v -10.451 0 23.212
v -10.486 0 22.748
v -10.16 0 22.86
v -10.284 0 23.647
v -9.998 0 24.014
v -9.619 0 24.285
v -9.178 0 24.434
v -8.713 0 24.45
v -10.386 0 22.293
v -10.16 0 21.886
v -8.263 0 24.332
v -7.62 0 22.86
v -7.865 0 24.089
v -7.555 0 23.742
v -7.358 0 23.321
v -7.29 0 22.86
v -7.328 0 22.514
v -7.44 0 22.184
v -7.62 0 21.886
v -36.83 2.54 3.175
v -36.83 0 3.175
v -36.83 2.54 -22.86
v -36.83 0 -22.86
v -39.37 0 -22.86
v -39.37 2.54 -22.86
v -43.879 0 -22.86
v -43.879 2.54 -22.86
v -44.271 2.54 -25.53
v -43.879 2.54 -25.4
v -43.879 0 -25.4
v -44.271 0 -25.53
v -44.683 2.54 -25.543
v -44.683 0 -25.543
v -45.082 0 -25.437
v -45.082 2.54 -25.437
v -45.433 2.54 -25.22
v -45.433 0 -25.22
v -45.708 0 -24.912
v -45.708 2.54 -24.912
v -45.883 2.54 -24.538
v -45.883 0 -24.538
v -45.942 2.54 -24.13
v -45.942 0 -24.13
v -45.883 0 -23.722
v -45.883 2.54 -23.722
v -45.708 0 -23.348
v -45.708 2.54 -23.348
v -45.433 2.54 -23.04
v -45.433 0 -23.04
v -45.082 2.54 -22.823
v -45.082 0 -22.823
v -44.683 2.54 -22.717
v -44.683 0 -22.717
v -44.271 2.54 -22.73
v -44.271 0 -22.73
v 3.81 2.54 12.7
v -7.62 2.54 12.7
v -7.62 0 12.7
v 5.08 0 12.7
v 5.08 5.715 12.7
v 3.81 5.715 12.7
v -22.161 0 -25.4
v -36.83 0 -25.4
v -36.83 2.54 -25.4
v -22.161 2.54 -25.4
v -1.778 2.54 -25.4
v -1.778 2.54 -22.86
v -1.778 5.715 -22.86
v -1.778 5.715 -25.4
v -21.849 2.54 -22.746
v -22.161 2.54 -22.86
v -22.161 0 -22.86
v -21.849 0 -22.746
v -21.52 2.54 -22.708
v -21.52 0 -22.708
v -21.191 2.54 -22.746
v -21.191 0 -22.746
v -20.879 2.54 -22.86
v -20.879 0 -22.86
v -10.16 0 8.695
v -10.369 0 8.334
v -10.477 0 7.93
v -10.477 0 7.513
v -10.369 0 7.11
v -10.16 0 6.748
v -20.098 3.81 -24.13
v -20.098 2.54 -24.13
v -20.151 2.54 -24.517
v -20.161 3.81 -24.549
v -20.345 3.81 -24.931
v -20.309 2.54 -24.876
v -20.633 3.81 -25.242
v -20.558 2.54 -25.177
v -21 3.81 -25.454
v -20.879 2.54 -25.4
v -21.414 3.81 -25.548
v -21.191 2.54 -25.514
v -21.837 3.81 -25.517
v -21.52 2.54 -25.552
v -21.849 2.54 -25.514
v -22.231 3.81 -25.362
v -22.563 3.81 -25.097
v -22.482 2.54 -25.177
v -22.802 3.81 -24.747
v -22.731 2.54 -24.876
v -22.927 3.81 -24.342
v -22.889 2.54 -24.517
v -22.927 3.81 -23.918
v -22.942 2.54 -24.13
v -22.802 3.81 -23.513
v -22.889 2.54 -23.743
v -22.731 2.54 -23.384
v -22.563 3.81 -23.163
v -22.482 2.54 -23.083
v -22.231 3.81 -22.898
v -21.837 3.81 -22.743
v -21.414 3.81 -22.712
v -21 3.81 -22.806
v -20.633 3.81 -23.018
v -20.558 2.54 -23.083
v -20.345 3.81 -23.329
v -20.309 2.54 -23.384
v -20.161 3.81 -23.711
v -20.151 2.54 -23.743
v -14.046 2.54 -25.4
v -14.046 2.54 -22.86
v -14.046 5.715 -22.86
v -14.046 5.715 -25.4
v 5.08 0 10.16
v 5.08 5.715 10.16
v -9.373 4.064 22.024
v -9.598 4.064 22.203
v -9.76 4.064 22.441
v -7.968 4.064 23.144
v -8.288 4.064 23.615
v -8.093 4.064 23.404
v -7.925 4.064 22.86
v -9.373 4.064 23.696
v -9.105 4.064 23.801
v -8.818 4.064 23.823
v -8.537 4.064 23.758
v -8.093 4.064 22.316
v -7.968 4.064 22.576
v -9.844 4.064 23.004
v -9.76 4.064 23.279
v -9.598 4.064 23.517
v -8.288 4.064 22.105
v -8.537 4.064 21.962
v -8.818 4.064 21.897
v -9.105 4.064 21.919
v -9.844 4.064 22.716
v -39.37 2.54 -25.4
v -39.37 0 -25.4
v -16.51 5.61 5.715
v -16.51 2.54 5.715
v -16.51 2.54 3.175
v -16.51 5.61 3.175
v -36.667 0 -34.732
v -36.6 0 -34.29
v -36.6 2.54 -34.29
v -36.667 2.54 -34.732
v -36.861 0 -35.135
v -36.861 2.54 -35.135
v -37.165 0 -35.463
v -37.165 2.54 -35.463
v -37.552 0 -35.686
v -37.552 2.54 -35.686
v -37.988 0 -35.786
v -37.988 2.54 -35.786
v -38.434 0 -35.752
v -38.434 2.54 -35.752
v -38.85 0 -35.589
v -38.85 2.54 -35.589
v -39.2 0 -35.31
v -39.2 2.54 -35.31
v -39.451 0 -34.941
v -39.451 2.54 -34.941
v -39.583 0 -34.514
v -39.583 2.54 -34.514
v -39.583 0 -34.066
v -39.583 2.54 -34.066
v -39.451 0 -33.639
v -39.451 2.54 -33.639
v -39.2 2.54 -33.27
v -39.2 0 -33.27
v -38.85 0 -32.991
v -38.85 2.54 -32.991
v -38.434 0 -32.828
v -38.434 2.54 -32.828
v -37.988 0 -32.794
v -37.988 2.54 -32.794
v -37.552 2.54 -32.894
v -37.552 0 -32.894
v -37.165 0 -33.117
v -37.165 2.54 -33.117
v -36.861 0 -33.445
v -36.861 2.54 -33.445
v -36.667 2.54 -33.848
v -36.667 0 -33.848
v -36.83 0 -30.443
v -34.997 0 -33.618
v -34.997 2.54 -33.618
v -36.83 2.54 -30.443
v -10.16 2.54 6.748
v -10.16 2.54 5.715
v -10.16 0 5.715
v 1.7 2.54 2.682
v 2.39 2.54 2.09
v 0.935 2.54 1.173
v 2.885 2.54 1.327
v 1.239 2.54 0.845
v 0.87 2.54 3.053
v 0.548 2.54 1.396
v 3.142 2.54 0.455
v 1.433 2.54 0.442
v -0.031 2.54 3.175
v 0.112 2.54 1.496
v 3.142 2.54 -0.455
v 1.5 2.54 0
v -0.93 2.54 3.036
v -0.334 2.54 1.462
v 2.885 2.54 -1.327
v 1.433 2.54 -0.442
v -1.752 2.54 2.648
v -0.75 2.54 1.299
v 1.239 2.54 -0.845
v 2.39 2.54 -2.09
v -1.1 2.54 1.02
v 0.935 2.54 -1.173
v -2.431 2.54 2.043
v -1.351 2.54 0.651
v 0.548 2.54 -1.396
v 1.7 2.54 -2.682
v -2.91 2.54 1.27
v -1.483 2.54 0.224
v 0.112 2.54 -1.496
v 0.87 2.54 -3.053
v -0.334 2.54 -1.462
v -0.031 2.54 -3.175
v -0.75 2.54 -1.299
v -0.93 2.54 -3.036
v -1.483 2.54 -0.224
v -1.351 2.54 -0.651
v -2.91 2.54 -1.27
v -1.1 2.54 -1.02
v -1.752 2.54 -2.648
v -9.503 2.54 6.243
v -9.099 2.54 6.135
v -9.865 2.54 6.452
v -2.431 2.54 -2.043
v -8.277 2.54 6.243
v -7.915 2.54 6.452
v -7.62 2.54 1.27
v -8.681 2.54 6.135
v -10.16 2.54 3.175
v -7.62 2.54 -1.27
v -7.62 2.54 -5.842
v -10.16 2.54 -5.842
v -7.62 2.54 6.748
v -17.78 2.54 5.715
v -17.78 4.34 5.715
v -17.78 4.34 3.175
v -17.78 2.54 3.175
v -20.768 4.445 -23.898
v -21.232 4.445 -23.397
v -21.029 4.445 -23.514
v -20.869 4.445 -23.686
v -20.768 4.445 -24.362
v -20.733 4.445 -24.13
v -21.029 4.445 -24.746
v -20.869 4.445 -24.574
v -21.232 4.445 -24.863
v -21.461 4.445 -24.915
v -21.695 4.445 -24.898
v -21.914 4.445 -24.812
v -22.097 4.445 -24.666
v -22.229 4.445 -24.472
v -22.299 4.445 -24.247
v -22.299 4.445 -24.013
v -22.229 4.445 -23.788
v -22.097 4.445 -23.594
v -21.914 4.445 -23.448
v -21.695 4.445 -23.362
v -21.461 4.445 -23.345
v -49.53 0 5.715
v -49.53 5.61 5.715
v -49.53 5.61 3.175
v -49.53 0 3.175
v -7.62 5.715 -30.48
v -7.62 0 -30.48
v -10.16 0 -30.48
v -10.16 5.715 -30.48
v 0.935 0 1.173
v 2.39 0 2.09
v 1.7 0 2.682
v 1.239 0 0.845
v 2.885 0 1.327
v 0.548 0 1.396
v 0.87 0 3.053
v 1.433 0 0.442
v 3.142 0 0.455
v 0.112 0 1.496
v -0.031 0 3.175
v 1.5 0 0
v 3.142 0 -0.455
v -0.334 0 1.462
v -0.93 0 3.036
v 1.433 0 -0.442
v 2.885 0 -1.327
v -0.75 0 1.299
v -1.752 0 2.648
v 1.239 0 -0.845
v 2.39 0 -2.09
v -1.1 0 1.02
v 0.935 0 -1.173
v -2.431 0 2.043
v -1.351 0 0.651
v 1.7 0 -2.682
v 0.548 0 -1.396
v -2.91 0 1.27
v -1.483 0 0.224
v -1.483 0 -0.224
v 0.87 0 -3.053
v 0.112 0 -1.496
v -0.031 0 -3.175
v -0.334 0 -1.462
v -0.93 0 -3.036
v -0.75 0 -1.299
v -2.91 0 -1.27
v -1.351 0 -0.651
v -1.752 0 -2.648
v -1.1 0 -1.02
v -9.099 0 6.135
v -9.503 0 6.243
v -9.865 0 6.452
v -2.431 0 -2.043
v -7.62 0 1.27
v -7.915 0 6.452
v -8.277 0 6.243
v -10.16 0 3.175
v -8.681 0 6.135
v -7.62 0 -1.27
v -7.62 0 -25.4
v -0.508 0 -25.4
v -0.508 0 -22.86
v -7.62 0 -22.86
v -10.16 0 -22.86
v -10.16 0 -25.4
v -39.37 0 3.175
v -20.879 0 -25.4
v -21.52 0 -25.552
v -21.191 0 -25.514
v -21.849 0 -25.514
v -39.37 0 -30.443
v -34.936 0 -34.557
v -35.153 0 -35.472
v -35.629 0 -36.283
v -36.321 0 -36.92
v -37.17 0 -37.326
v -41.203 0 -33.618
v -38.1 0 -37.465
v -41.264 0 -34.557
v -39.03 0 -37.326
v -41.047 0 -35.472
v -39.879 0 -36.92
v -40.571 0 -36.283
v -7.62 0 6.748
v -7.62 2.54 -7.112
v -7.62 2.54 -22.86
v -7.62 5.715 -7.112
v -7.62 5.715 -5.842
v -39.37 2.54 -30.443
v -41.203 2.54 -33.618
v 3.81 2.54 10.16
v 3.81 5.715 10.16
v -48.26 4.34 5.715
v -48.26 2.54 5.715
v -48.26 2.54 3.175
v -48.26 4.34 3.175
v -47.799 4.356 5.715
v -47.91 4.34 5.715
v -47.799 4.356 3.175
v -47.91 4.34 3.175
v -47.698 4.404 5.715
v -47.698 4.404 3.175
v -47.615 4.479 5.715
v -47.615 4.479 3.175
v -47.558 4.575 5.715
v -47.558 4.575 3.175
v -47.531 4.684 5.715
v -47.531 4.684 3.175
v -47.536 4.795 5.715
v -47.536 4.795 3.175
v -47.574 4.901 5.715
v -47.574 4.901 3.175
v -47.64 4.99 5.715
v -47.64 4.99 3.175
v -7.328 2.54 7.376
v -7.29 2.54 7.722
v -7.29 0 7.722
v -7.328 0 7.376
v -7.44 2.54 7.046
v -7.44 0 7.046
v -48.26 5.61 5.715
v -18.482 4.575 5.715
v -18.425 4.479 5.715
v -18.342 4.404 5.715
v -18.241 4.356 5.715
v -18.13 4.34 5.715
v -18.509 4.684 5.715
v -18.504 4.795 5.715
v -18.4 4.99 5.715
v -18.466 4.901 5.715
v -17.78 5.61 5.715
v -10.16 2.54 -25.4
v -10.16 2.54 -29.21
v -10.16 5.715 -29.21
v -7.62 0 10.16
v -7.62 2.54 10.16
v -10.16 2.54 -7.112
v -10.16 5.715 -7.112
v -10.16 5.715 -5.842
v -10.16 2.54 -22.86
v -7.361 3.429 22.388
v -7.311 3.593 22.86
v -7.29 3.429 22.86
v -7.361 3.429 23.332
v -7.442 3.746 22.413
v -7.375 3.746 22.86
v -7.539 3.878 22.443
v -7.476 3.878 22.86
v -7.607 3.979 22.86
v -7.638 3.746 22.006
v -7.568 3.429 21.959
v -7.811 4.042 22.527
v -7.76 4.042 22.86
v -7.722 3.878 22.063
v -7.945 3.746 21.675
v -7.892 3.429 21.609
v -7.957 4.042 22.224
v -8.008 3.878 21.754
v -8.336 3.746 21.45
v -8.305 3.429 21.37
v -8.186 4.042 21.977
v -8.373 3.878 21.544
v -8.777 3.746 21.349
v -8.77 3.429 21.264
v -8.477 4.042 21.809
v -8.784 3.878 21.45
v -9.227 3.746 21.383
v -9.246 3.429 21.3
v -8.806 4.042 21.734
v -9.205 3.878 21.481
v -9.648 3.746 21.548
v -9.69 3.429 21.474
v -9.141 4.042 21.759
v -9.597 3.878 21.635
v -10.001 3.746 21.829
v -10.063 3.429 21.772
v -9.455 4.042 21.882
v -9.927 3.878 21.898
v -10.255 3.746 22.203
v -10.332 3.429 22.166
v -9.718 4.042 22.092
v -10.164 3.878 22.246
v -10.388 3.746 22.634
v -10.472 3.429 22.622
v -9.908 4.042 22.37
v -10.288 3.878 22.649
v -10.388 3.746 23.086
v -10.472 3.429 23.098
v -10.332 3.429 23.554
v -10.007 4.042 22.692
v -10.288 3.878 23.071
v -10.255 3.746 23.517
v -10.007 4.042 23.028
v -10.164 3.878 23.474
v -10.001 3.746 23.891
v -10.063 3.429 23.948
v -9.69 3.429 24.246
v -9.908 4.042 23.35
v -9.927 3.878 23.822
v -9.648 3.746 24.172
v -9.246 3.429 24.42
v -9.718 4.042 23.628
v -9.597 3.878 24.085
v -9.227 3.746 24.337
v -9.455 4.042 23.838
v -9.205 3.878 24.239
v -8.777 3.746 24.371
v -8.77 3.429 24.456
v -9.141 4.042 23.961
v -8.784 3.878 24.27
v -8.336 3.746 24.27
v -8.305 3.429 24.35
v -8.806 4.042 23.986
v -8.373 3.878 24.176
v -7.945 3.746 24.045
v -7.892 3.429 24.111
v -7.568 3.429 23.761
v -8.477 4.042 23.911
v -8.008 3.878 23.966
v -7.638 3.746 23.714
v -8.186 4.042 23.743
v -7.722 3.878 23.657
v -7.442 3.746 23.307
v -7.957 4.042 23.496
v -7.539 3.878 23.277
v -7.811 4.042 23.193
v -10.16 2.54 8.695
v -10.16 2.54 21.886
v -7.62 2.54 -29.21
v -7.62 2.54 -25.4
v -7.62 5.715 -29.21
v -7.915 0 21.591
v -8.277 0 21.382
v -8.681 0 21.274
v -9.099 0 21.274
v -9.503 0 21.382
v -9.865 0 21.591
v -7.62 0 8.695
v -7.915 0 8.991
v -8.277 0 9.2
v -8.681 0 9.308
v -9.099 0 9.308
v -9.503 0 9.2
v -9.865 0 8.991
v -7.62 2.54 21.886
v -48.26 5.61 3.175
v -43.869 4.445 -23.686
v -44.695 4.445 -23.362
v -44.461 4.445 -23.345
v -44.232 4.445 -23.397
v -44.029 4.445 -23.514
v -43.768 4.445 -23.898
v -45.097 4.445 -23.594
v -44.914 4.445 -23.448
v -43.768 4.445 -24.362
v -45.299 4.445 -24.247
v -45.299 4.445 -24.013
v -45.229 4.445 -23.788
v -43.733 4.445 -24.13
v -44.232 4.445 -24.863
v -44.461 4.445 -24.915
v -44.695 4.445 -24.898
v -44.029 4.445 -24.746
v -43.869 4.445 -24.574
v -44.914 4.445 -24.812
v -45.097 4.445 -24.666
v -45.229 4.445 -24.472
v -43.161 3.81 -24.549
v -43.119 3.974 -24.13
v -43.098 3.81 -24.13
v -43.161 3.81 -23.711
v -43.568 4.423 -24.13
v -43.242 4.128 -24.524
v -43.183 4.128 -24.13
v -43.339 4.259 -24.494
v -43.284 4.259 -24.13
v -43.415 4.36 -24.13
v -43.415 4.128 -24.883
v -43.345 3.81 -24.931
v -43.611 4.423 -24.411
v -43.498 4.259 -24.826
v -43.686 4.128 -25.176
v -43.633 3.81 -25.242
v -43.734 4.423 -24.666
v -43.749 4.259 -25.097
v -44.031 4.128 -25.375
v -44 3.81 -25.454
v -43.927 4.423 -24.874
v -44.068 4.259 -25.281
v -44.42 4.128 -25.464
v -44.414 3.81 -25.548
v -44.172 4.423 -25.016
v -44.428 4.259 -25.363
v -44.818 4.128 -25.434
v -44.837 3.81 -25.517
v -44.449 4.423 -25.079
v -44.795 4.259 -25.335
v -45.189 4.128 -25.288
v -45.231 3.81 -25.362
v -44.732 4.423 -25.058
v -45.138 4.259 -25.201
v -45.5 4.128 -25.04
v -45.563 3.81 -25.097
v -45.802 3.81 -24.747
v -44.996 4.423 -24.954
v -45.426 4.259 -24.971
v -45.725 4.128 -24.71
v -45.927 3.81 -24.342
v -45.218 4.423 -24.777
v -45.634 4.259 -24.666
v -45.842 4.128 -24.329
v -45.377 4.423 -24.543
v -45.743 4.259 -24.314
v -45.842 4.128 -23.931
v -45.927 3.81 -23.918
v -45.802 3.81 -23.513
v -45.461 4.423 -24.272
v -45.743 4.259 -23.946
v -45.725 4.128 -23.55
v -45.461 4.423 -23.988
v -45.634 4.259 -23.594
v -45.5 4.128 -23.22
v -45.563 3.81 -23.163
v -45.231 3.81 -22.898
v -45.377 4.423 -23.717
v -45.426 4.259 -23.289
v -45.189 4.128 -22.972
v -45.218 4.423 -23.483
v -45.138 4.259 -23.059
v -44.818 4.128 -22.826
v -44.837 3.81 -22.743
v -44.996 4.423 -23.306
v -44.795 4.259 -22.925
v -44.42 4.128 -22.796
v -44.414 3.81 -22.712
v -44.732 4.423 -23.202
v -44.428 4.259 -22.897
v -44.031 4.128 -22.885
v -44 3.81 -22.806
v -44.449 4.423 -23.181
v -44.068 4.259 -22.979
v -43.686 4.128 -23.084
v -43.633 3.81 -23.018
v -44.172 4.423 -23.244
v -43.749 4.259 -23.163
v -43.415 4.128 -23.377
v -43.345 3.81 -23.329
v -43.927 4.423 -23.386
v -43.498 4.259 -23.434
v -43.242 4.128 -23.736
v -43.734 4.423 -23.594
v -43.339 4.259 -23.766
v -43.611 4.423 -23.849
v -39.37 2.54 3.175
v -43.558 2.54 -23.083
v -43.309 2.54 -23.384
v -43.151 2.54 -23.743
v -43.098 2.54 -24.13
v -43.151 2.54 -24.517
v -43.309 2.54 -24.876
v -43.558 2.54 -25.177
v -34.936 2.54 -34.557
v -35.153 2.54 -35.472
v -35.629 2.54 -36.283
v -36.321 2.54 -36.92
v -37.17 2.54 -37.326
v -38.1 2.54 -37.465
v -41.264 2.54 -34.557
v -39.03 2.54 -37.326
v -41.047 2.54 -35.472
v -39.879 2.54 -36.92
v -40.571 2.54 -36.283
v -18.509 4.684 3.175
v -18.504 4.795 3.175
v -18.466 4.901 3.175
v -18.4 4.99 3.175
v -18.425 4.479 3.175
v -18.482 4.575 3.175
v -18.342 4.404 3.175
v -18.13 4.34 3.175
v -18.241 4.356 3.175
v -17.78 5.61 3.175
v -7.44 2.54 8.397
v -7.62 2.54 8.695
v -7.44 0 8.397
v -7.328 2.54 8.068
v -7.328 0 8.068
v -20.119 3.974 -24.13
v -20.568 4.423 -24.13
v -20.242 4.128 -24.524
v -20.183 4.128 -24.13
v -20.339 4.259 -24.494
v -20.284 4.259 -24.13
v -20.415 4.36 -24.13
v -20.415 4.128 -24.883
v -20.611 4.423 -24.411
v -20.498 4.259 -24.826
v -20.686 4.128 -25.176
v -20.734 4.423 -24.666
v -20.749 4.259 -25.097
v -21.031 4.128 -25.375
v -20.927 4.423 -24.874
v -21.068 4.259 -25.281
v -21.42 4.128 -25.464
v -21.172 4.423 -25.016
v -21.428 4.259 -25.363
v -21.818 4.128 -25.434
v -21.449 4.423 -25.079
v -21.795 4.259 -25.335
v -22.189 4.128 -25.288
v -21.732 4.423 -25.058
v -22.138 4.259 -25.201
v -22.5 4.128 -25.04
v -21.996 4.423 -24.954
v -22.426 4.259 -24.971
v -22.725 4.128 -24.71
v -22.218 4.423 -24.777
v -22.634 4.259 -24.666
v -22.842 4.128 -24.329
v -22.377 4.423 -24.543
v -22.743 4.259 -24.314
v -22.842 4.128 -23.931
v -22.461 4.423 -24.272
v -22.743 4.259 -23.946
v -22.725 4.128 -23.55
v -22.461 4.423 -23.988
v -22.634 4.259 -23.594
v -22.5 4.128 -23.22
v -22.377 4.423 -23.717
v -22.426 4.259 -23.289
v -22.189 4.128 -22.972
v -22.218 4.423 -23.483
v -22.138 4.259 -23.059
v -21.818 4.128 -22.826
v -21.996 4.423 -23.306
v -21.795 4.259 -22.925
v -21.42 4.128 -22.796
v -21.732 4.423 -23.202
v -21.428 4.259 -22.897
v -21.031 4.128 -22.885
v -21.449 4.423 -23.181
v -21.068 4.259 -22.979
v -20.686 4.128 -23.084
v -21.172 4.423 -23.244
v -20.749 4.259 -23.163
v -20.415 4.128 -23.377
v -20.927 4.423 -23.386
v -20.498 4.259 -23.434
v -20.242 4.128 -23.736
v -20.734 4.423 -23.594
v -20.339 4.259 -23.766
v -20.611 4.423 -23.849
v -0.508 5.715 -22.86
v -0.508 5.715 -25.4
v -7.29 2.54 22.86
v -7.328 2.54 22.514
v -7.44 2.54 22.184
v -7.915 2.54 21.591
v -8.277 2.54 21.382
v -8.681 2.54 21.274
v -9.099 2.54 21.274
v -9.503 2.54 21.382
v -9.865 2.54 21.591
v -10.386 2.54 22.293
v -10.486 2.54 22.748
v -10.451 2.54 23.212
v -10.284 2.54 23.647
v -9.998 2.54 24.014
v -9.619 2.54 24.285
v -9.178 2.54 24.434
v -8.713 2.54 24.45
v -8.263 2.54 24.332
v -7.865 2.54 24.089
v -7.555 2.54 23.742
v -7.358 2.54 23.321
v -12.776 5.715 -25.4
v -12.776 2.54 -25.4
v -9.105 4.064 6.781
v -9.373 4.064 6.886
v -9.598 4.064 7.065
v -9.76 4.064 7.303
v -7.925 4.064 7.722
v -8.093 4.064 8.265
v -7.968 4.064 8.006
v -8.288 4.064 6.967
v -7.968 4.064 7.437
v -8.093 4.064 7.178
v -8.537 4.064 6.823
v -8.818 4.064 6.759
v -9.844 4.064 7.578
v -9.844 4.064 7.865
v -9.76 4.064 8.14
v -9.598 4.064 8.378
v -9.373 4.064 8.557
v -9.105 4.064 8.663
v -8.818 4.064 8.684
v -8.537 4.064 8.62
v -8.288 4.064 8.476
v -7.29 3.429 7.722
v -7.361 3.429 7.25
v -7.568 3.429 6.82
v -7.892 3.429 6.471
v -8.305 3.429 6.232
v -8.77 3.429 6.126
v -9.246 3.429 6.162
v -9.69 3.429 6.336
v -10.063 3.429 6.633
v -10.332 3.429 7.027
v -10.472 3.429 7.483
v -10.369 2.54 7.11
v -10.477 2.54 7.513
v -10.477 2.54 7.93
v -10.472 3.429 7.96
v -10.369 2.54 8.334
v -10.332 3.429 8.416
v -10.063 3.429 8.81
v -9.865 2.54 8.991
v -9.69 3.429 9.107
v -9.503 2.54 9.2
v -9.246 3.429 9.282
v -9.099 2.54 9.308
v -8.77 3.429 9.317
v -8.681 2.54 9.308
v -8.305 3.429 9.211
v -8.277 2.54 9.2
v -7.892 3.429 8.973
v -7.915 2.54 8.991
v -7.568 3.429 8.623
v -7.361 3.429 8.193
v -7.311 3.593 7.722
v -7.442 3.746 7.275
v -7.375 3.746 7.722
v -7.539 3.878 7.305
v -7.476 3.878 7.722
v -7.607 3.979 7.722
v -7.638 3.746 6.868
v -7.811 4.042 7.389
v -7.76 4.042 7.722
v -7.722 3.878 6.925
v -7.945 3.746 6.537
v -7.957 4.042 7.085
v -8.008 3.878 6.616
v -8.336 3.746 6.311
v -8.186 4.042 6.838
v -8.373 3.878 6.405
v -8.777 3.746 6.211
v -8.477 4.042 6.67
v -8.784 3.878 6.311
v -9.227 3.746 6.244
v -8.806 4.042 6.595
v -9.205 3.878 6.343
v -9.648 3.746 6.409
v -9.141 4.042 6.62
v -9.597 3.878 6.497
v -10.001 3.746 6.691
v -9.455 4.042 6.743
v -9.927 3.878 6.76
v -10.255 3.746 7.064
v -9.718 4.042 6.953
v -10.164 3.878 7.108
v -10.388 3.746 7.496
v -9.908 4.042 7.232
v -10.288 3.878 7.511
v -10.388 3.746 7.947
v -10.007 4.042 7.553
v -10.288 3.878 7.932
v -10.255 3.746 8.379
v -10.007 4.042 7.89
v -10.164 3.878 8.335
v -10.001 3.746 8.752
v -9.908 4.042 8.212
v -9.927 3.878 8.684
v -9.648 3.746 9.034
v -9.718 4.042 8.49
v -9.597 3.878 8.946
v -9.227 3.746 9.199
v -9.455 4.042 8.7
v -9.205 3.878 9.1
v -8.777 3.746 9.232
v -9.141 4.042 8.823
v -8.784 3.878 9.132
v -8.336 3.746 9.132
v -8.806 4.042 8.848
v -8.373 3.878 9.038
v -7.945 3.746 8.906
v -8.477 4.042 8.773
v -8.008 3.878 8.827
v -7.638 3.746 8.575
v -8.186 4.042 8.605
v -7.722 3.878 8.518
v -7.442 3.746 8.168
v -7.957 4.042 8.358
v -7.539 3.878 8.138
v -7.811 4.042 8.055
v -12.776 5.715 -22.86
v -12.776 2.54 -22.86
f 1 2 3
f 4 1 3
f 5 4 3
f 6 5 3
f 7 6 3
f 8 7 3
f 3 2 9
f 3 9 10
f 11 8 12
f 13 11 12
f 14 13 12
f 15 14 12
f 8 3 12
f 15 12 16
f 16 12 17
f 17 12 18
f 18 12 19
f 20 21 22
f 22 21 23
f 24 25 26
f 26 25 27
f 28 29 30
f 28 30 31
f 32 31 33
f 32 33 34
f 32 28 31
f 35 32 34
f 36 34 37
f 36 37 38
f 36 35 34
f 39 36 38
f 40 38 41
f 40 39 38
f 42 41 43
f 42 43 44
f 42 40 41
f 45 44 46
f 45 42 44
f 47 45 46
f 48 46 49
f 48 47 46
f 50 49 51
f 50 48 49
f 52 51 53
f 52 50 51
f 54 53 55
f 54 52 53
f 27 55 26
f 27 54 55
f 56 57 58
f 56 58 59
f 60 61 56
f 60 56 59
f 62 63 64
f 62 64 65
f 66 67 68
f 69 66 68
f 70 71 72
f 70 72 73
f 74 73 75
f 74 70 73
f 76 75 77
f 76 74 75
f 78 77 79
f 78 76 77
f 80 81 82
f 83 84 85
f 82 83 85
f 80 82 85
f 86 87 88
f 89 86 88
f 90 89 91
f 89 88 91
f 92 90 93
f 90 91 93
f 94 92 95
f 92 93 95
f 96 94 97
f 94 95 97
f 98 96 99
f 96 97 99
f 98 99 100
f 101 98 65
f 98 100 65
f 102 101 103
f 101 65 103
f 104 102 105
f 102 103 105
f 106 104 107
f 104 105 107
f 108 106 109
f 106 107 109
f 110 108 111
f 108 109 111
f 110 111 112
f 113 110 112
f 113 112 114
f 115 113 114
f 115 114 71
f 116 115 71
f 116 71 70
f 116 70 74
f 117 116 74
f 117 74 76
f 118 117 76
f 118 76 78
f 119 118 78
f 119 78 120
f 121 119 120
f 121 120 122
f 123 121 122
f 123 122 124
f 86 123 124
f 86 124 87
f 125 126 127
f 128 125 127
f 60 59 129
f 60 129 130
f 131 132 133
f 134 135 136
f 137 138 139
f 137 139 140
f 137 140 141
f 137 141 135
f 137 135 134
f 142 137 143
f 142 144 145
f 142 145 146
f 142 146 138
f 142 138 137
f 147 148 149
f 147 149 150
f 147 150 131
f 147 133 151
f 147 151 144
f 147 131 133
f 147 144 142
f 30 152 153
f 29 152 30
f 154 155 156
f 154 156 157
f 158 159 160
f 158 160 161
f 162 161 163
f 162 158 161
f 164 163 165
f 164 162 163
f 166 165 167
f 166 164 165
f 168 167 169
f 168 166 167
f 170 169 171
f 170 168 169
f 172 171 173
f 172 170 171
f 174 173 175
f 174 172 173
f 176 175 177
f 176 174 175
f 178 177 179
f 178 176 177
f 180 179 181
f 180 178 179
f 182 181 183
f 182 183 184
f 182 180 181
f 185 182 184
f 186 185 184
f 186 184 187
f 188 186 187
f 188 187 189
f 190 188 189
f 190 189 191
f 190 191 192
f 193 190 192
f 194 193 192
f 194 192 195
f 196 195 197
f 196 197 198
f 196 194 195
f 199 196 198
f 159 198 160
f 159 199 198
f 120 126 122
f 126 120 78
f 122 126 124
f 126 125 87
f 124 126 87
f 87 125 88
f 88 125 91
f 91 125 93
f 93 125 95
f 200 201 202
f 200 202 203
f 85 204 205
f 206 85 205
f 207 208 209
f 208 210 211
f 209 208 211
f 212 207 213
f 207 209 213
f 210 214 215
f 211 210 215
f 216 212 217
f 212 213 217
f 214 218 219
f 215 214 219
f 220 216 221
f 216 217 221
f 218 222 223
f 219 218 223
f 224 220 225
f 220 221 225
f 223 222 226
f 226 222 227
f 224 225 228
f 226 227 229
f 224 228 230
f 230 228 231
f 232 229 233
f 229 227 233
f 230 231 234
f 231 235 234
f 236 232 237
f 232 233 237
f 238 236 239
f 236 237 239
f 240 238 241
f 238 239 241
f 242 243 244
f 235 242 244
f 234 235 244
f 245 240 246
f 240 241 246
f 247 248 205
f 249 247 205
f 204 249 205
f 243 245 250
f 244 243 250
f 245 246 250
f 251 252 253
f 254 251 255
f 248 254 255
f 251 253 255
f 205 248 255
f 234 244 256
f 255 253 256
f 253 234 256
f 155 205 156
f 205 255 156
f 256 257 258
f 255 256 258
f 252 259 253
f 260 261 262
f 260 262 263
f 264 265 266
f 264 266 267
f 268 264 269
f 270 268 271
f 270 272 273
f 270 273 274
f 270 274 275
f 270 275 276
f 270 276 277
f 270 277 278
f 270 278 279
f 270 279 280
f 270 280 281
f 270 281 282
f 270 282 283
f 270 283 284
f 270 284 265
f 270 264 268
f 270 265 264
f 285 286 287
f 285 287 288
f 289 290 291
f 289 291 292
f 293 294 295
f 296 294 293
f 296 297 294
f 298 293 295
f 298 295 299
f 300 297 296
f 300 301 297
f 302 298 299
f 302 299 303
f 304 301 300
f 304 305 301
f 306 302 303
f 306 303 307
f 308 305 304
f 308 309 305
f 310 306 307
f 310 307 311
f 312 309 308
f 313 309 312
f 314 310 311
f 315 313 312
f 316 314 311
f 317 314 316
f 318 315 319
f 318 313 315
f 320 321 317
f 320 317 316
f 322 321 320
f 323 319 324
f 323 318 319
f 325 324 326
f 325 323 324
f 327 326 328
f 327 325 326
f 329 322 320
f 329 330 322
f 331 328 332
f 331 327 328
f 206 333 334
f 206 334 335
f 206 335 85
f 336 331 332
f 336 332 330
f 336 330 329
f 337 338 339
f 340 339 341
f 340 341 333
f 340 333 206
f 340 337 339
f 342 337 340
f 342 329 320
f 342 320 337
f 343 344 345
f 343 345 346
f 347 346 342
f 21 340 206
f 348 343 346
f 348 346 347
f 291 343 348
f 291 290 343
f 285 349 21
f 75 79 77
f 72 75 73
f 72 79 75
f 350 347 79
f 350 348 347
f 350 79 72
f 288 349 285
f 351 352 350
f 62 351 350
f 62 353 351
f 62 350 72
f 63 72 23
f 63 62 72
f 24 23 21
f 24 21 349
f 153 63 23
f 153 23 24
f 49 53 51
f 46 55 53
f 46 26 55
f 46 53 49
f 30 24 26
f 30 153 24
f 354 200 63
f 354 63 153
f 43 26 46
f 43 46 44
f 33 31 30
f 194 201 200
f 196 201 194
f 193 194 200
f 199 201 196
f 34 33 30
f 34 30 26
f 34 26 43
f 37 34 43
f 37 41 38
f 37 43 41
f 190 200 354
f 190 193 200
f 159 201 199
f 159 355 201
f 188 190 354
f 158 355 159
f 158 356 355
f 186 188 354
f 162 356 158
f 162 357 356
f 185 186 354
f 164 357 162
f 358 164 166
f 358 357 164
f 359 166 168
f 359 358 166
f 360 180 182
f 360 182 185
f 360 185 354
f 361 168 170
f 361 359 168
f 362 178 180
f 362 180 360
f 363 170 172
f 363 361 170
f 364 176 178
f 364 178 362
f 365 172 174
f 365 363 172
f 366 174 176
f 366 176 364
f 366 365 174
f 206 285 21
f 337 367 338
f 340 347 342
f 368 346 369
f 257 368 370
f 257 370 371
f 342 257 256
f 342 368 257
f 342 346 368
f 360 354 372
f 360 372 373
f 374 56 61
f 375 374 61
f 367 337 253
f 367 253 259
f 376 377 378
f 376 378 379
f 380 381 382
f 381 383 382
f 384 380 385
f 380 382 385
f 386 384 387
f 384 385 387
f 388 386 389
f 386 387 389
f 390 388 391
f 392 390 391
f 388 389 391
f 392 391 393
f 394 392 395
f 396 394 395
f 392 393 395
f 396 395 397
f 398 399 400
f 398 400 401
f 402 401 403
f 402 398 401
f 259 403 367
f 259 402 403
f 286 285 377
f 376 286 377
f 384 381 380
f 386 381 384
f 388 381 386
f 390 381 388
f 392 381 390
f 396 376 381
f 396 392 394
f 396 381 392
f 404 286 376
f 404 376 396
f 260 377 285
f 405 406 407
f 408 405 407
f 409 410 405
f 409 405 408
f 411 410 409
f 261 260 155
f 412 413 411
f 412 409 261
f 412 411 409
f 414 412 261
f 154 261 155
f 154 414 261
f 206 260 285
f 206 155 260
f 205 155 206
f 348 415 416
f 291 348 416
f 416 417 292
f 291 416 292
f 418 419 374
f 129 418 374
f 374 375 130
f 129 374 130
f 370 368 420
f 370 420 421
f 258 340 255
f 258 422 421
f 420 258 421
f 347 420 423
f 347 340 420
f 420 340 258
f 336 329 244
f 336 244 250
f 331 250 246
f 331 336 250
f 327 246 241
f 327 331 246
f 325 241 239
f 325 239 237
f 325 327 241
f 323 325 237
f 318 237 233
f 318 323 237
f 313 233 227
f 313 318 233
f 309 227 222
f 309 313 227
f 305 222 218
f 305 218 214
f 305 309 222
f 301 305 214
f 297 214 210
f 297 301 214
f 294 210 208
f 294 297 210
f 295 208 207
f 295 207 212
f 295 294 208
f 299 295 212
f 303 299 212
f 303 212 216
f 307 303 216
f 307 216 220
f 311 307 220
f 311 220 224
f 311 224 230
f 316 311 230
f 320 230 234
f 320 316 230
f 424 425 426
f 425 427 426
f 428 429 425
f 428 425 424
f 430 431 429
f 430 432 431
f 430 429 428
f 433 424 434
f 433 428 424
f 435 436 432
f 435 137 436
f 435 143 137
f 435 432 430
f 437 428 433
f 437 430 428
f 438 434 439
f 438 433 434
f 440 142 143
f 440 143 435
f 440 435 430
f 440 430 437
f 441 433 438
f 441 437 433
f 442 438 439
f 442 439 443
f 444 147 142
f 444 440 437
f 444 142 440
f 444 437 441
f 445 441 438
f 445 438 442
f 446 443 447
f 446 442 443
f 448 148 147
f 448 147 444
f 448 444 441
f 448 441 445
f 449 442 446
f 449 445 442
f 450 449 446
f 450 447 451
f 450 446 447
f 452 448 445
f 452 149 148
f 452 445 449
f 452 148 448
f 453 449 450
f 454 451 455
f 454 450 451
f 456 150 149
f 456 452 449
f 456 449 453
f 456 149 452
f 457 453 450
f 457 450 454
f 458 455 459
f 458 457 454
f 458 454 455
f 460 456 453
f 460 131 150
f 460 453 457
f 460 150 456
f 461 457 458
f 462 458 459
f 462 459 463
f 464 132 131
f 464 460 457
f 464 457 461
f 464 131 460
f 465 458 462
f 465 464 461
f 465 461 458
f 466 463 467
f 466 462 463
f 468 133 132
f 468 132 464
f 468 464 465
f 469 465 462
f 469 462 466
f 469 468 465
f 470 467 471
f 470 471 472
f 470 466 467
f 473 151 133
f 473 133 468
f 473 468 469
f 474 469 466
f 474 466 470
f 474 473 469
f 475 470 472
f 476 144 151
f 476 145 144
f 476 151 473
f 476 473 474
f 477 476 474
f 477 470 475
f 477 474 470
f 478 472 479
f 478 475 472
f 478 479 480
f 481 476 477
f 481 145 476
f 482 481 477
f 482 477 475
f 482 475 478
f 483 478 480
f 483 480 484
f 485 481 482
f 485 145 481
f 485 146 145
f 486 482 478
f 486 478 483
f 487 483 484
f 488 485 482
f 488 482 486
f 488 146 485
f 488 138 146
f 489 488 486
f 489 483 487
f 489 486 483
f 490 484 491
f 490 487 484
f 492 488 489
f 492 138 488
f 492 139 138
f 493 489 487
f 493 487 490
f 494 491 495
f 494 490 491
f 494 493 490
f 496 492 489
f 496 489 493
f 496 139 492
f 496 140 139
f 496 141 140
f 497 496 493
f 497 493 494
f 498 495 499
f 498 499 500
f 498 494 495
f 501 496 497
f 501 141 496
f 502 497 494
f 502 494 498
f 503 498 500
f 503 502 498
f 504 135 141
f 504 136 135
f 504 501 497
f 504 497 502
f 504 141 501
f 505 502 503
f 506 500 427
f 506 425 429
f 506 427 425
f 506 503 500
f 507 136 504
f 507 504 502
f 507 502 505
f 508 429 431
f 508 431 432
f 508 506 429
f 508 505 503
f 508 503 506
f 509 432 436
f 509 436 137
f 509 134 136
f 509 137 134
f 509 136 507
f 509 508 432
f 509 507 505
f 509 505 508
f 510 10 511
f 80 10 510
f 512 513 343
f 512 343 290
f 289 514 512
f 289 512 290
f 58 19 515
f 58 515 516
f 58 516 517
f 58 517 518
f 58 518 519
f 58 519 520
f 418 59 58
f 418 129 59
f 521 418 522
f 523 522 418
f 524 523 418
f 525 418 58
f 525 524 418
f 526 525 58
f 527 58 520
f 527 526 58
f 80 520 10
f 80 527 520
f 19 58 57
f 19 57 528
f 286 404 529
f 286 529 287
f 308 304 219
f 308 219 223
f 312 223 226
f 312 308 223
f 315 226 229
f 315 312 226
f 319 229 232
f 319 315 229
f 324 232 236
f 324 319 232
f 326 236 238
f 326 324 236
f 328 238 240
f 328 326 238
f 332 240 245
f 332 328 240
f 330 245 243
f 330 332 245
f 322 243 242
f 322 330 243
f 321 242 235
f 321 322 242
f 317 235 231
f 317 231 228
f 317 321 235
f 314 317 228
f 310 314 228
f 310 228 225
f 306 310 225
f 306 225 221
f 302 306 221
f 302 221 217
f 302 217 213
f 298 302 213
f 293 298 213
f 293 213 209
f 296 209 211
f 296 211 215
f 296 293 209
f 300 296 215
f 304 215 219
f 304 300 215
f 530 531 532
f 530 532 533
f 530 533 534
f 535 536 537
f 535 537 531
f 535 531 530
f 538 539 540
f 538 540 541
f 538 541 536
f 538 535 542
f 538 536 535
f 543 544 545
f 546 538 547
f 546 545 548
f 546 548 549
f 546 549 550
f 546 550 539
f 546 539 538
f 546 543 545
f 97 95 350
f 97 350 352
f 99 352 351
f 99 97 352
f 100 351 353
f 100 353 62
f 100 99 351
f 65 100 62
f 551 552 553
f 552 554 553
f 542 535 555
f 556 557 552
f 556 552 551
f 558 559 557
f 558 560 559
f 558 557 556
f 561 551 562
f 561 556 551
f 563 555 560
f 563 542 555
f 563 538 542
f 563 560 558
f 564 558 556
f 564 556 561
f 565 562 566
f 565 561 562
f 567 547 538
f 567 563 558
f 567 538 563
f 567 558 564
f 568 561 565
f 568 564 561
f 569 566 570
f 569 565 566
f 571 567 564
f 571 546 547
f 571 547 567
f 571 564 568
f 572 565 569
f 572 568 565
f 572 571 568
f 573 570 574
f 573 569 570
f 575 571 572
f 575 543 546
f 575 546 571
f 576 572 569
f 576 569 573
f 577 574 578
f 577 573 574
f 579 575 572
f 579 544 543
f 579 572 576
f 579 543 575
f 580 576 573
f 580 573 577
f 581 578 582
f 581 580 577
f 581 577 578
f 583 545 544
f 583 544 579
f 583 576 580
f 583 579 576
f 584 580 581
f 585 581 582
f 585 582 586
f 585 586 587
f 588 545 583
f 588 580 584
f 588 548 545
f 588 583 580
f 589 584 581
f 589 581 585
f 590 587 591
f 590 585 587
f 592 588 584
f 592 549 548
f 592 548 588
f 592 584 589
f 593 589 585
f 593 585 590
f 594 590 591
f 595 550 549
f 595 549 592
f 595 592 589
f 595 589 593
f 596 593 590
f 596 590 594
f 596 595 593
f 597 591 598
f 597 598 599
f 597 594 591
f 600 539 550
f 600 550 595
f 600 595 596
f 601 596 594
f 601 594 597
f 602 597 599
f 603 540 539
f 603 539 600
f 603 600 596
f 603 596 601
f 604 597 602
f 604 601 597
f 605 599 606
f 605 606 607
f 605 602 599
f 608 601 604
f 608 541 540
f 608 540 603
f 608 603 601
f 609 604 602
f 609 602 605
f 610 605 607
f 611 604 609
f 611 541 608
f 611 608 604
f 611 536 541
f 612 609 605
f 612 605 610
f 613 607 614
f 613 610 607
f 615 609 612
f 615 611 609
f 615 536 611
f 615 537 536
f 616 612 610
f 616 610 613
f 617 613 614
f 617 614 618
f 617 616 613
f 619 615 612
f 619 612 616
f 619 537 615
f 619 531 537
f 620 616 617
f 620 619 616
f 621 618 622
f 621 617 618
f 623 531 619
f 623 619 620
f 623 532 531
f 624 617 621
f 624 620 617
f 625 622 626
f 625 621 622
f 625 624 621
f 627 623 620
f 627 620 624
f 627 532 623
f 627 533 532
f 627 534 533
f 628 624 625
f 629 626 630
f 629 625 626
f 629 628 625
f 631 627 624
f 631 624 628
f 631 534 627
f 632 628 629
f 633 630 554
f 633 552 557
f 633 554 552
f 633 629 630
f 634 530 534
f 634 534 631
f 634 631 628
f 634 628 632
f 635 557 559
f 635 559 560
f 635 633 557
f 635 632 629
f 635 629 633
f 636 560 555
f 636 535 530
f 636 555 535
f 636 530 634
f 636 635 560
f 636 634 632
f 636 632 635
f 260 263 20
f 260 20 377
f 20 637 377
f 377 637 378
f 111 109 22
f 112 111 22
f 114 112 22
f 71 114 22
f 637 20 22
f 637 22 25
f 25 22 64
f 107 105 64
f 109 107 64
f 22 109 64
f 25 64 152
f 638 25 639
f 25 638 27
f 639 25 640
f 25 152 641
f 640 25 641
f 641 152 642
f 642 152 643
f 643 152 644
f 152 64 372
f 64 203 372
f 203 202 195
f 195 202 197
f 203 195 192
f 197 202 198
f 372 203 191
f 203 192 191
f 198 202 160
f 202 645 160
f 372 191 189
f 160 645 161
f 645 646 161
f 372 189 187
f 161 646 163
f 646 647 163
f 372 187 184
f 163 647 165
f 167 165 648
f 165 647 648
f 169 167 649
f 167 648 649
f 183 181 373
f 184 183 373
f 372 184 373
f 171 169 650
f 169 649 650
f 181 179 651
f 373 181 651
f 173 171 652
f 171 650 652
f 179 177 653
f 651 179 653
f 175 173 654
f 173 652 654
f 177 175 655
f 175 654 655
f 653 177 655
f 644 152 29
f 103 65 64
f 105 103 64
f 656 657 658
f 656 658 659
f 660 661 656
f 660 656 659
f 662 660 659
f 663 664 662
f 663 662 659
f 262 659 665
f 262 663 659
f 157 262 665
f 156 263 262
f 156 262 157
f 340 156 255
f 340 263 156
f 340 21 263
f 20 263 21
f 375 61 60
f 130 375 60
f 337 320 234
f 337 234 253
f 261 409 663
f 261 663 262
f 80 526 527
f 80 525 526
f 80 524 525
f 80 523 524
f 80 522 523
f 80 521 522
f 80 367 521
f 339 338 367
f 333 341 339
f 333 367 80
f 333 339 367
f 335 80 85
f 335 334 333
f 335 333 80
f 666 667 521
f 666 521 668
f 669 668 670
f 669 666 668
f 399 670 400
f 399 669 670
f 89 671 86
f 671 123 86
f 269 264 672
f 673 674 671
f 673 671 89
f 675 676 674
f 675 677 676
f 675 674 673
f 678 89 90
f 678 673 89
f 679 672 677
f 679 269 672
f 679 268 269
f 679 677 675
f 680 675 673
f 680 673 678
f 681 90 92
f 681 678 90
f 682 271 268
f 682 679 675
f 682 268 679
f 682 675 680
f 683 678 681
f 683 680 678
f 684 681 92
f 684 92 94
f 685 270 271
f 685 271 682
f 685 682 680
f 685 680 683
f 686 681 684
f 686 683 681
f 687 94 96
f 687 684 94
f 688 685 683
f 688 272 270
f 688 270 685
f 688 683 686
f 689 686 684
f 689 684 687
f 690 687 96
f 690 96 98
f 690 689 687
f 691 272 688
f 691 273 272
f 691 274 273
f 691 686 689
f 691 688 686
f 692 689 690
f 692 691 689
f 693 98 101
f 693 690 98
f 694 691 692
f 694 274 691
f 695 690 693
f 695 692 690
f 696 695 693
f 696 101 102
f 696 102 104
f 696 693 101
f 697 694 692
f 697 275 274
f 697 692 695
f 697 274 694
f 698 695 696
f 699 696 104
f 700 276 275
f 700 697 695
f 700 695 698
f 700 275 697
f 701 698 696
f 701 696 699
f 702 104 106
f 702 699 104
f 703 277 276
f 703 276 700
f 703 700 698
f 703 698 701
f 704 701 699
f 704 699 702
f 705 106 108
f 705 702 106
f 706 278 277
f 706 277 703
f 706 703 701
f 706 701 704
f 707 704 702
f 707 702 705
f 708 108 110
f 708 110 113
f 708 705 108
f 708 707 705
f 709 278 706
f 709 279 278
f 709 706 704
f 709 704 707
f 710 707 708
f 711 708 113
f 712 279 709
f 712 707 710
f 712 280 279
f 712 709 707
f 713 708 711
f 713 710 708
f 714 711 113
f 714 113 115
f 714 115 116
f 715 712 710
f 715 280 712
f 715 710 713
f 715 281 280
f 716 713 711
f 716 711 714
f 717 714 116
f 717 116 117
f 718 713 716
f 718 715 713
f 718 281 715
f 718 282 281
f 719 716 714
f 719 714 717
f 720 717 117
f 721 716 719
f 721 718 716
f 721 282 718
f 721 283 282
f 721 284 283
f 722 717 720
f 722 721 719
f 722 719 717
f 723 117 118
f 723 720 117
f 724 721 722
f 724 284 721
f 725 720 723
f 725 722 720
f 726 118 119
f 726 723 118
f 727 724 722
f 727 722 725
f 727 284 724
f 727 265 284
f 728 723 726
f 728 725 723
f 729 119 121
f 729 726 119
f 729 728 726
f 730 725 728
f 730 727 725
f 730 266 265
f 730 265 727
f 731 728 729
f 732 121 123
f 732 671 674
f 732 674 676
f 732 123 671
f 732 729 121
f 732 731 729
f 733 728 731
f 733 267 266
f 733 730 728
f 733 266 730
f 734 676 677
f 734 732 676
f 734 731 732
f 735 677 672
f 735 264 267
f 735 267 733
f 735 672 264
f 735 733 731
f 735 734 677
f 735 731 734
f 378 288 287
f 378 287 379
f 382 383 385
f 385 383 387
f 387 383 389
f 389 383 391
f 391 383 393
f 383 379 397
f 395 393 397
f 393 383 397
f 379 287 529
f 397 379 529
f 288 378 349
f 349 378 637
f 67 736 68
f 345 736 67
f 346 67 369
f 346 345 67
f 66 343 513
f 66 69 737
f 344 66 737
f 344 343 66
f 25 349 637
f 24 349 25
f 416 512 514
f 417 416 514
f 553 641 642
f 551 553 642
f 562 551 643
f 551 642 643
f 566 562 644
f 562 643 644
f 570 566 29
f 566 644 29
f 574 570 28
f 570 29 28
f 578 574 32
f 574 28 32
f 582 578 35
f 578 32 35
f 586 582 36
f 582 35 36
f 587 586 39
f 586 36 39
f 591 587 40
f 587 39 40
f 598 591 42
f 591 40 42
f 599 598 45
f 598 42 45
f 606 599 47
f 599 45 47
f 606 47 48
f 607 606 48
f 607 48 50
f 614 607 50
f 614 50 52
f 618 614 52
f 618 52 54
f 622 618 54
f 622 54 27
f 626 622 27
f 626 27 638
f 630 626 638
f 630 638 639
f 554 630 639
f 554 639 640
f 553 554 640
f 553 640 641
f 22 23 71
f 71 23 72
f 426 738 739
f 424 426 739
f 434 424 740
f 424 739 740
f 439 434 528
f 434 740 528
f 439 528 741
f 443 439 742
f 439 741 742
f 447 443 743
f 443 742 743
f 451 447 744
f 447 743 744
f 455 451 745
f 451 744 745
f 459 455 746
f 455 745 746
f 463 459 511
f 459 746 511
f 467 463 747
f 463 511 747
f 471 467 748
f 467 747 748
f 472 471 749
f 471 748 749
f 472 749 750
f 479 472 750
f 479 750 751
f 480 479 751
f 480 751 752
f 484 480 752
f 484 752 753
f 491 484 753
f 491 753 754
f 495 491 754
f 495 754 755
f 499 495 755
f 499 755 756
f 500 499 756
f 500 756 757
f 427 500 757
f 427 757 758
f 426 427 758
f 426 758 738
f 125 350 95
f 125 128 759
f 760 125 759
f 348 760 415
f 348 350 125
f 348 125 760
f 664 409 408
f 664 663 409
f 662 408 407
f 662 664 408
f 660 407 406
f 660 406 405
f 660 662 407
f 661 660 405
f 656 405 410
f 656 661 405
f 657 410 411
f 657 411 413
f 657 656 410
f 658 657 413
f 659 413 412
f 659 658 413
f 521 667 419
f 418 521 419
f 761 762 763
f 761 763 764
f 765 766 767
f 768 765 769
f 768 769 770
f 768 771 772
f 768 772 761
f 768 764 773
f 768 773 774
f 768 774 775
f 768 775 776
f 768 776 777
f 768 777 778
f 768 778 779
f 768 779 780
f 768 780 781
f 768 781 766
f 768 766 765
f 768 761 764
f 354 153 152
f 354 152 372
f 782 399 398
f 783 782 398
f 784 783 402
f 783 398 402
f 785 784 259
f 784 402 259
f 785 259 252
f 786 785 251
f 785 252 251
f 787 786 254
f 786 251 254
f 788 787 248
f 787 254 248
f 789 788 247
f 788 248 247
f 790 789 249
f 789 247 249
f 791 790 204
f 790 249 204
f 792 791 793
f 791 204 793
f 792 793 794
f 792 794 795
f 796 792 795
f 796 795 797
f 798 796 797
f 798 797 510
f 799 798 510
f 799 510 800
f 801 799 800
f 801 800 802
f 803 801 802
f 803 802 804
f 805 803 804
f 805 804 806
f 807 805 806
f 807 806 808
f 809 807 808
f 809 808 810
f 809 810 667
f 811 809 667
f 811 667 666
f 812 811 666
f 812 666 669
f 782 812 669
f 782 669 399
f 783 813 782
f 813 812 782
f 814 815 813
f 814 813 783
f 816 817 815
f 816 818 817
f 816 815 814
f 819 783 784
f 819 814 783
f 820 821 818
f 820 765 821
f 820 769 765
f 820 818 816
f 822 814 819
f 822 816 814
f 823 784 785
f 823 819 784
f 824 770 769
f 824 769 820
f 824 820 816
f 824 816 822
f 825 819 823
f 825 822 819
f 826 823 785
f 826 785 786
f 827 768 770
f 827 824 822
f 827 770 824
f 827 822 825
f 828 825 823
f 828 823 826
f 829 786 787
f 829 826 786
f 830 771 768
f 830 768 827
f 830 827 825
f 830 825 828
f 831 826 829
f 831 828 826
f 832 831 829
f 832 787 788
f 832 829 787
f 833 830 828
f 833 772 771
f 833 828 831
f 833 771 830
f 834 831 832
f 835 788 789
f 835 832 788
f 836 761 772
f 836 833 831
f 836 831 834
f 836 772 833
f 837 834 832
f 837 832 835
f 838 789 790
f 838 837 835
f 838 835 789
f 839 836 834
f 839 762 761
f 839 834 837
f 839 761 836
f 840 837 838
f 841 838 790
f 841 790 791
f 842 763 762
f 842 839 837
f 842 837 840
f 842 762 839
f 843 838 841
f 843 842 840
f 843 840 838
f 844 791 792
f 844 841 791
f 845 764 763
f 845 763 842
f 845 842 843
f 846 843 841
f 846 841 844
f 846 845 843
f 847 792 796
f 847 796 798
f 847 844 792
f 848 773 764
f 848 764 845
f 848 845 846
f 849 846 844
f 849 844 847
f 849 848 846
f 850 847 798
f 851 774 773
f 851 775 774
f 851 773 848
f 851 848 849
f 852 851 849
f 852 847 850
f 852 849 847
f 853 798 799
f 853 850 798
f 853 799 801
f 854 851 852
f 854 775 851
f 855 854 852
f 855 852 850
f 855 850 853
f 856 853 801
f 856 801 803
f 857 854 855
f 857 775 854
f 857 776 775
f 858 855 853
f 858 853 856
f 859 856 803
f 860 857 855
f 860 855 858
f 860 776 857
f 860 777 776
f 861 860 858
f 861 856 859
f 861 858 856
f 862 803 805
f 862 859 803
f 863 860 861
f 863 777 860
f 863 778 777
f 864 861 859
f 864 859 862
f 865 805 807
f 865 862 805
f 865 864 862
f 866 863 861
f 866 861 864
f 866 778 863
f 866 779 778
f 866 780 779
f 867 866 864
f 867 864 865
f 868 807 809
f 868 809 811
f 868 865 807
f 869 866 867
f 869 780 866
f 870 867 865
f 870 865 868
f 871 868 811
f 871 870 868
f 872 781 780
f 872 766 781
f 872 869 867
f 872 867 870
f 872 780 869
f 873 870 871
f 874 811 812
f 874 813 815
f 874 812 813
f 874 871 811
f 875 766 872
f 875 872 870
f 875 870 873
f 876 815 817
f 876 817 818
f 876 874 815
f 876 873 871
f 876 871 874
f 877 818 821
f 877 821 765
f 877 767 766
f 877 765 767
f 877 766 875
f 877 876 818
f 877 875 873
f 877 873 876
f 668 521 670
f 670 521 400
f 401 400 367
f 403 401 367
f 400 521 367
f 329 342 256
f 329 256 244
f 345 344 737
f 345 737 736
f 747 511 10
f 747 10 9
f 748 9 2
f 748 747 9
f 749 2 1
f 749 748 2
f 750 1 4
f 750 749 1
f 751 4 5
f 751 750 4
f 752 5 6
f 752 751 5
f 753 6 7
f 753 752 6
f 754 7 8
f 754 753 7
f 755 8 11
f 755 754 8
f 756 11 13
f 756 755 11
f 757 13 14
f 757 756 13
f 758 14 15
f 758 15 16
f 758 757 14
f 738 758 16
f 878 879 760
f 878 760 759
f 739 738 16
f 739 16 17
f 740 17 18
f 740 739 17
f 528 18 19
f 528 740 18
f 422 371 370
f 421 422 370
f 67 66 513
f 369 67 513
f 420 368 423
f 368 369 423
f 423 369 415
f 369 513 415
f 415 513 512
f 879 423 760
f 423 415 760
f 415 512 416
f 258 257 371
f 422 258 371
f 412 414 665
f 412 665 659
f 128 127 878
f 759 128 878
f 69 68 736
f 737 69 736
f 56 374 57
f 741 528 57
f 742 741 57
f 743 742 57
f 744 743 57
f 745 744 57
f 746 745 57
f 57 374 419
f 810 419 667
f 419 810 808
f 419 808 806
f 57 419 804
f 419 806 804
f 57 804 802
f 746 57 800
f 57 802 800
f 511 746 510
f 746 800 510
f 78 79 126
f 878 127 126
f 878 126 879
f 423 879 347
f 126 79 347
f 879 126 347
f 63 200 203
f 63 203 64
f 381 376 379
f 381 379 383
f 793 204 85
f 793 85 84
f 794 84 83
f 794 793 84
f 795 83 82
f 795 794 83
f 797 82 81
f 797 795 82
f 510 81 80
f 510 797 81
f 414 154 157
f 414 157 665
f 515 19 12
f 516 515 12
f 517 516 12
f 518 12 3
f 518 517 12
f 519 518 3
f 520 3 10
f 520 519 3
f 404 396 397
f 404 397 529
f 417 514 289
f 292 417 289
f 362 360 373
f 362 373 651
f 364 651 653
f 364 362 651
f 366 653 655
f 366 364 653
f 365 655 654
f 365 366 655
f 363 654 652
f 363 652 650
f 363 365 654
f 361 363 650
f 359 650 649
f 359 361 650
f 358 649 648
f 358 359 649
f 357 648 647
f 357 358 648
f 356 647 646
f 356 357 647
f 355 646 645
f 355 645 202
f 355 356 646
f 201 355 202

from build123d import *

# Parameters (mm, degrees)
SKETCH1_R                = 1.5
SKETCH1_W                = 26.67
SKETCH1_H                = 26.035
BOSS_EXTRUDE1_DEPTH      = 2.54
SKETCH3_W                = 1.27
SKETCH3_H                = 3.175
BOSS_EXTRUDE3_DEPTH      = 2.54
BOSS_EXTRUDE4_DEPTH      = 2.54
SKETCH5_W                = 1.27
SKETCH5_H                = 3.175
BOSS_EXTRUDE5_DEPTH      = 2.54
SKETCH7_W                = 1.27
SKETCH7_H                = 3.175
BOSS_EXTRUDE6_DEPTH      = 2.54
FILLET1_R                = 0.381
CUT_EXTRUDE2_REACH       = 16.605
SKETCH11_W               = 4.50557805
SKETCH11_H               = 5.61
SKETCH11_W_2             = 2.400870557
SKETCH11_H_2             = 3.07
SKETCH8_R                = 1.4224
BOSS_EXTRUDE7_DEPTH      = 1.905
BOSS_EXTRUDE7_DEPTH_BACK = 2.54
SKETCH10_R               = 1.6002
BOSS_EXTRUDE8_DEPTH      = 1.524
BOSS_EXTRUDE8_DEPTH_BACK = 2.54
FILLET2_R                = 0.635


with BuildPart() as part:
    # Sketch1 → Boss-Extrude1 (new body)
    with BuildSketch(Plane(origin=(0, 0, 0), x_dir=(1, 0, 0), z_dir=(0, 1, 0))):
        with BuildLine():
            Line((-10.16, -22.86), (-10.16, -5.715))
            Line((-10.16, -5.715), (-49.53, -5.715))
            Line((-49.53, -5.715), (-49.53, -3.175))
            Line((-49.53, -3.175), (-39.37, -3.175))
            Line((-39.37, -3.175), (-39.37, 22.86))
            Line((-39.37, 22.86), (-49.53, 22.86))
            Line((-49.53, 22.86), (-49.53, 25.4))
            Line((-49.53, 25.4), (-39.37, 25.4))
            Line((-39.37, 25.4), (-39.37, 30.443080793))
            Line((-39.37, 30.443080793), (-41.203087105, 33.618080793))
            ThreePointArc((-41.203087105, 33.618080793), (-38.1, 37.465), (-34.996912895, 33.618080793))
            Line((-34.996912895, 33.618080793), (-36.83, 30.443080793))
            Line((-36.83, 30.443080793), (-36.83, 25.4))
            Line((-36.83, 25.4), (-10.16, 25.4))
            Line((-10.16, 25.4), (-10.16, 30.48))
            Line((-10.16, 30.48), (-7.62, 30.48))
            Line((-7.62, 30.48), (-7.62, 25.4))
            Line((-7.62, 25.4), (-0.508, 25.4))
            Line((-0.508, 25.4), (-0.508, 22.86))
            Line((-0.508, 22.86), (-7.62, 22.86))
            Line((-7.62, 22.86), (-7.62, 1.27))
            Line((-7.62, 1.27), (-2.909935566, 1.27))
            ThreePointArc((-2.909935566, 1.27), (3.175, 0), (-2.909935566, -1.27))
            Line((-2.909935566, -1.27), (-7.62, -1.27))
            Line((-7.62, -1.27), (-7.62, -10.16))
            Line((-7.62, -10.16), (5.08, -10.16))
            Line((5.08, -10.16), (5.08, -12.7))
            Line((5.08, -12.7), (-7.62, -12.7))
            Line((-7.62, -12.7), (-7.62, -22.86))
            Line((-7.62, -22.86), (-10.16, -22.86))
        make_face()
        with Locations((-38.1, 34.29)):
            Circle(SKETCH1_R, mode=Mode.SUBTRACT)
        Circle(SKETCH1_R, mode=Mode.SUBTRACT)
        with Locations((-23.495, 9.8425)):
            Rectangle(SKETCH1_W, SKETCH1_H, mode=Mode.SUBTRACT)
    extrude(amount=BOSS_EXTRUDE1_DEPTH)

    # Sketch3 → Boss-Extrude3 (add)
    with BuildSketch(Plane.XY.offset(-22.86)):
        Polygon((-49.53, 2.54), (-49.53, 5.61), (-48.26, 5.61), (-46.99, 4.34), (-48.26, 4.34), (-48.26, 2.54), align=None)
        with Locations((-1.143, 4.1275)):
            Rectangle(SKETCH3_W, SKETCH3_H)
        Polygon((-16.51, 2.54), (-17.78, 2.54), (-17.78, 4.34), (-19.05, 4.34), (-17.78, 5.61), (-16.51, 5.61), align=None)
        with Locations((-13.4112, 4.1275)):
            Rectangle(SKETCH3_W, SKETCH3_H)
    extrude(amount=-BOSS_EXTRUDE3_DEPTH)

    # Sketch4 → Boss-Extrude4 (add)
    with BuildSketch(Plane.XY.offset(5.715)):
        Polygon((-17.78, 2.54), (-16.51, 2.54), (-16.51, 5.61), (-17.78, 5.61), (-19.05, 4.34), (-17.78, 4.34), align=None)
        Polygon((-49.53, 2.54), (-48.26, 2.54), (-48.26, 4.34), (-46.99, 4.34), (-48.26, 5.61), (-49.53, 5.61), align=None)
    extrude(amount=-BOSS_EXTRUDE4_DEPTH)

    # Sketch5 → Boss-Extrude5 (add)
    with BuildSketch(Plane(origin=(-7.62, 0, 0), x_dir=(0, 0, -1), z_dir=(1, 0, 0))):
        with Locations((6.477, 4.1275)):
            Rectangle(SKETCH5_W, SKETCH5_H)
        with Locations((29.845, 4.1275)):
            Rectangle(SKETCH5_W, SKETCH5_H)
    extrude(amount=-BOSS_EXTRUDE5_DEPTH)

    # Sketch7 → Boss-Extrude6 (add)
    with BuildSketch(Plane.XY.offset(12.7)):
        with Locations((4.445, 4.1275)):
            Rectangle(SKETCH7_W, SKETCH7_H)
    extrude(amount=-BOSS_EXTRUDE6_DEPTH)

    # Fillet1
    fillet1_edges = [part.edges().sort_by_distance(p)[0] for p in [
        (-46.99, 4.34, -24.13),
        (-19.05, 4.34, -24.13),
        (-46.99, 4.34, 4.445),
        (-19.05, 4.34, 4.445),
    ]]
    fillet(fillet1_edges, radius=FILLET1_R)

    # Sketch11 → Cut-Extrude2 (cut, up to next)
    with BuildSketch(Plane.XY.offset(-22.86), mode=Mode.PRIVATE) as cut_extrude2_sk1:
        with Locations((-47.277210975, 2.805)):
            Rectangle(SKETCH11_W, SKETCH11_H)
    cut_extrude2_tool1 = extrude(cut_extrude2_sk1.sketch, amount=-CUT_EXTRUDE2_REACH, mode=Mode.PRIVATE) & part.part
    add(cut_extrude2_tool1.solids().sort_by_distance((-47.277211, 2.805, -22.86))[0], mode=Mode.SUBTRACT)
    # Sketch11 → Cut-Extrude2 (cut, up to next)
    with BuildSketch(Plane.XY.offset(-22.86), mode=Mode.PRIVATE) as cut_extrude2_sk2:
        with Locations((-17.710435279, 4.075)):
            Rectangle(SKETCH11_W_2, SKETCH11_H_2)
    cut_extrude2_tool2 = extrude(cut_extrude2_sk2.sketch, amount=-CUT_EXTRUDE2_REACH, mode=Mode.PRIVATE) & part.part
    add(cut_extrude2_tool2.solids().sort_by_distance((-17.710435, 4.075, -22.86))[0], mode=Mode.SUBTRACT)

    # Sketch8 → Boss-Extrude7 (add, two sides)
    with BuildSketch(Plane(origin=(0, 2.54, 0), x_dir=(1, 0, 0), z_dir=(0, 1, 0))) as boss_extrude7_sk:
        with Locations((-44.52, 24.13)):
            Circle(SKETCH8_R)
        with Locations((-21.52, 24.13)):
            Circle(SKETCH8_R)
    extrude(amount=BOSS_EXTRUDE7_DEPTH)
    extrude(boss_extrude7_sk.sketch, amount=-BOSS_EXTRUDE7_DEPTH_BACK)

    # Sketch10 → Boss-Extrude8 (add, two sides)
    with BuildSketch(Plane(origin=(0, 2.54, 0), x_dir=(1, 0, 0), z_dir=(0, 1, 0))) as boss_extrude8_sk:
        with Locations((-8.89, -7.7216)):
            Circle(SKETCH10_R)
        with Locations((-8.89, -22.86)):
            Circle(SKETCH10_R)
    extrude(amount=BOSS_EXTRUDE8_DEPTH)
    extrude(boss_extrude8_sk.sketch, amount=-BOSS_EXTRUDE8_DEPTH_BACK)

    # Fillet2
    fillet2_edges = [part.edges().sort_by_distance(p)[0] for p in [
        (-45.9424, 4.445, -24.13),
        (-22.9424, 4.445, -24.13),
        (-10.4902, 4.064, 7.7216),
        (-10.4902, 4.064, 22.86),
    ]]
    fillet(fillet2_edges, radius=FILLET2_R)


solid = part.part
